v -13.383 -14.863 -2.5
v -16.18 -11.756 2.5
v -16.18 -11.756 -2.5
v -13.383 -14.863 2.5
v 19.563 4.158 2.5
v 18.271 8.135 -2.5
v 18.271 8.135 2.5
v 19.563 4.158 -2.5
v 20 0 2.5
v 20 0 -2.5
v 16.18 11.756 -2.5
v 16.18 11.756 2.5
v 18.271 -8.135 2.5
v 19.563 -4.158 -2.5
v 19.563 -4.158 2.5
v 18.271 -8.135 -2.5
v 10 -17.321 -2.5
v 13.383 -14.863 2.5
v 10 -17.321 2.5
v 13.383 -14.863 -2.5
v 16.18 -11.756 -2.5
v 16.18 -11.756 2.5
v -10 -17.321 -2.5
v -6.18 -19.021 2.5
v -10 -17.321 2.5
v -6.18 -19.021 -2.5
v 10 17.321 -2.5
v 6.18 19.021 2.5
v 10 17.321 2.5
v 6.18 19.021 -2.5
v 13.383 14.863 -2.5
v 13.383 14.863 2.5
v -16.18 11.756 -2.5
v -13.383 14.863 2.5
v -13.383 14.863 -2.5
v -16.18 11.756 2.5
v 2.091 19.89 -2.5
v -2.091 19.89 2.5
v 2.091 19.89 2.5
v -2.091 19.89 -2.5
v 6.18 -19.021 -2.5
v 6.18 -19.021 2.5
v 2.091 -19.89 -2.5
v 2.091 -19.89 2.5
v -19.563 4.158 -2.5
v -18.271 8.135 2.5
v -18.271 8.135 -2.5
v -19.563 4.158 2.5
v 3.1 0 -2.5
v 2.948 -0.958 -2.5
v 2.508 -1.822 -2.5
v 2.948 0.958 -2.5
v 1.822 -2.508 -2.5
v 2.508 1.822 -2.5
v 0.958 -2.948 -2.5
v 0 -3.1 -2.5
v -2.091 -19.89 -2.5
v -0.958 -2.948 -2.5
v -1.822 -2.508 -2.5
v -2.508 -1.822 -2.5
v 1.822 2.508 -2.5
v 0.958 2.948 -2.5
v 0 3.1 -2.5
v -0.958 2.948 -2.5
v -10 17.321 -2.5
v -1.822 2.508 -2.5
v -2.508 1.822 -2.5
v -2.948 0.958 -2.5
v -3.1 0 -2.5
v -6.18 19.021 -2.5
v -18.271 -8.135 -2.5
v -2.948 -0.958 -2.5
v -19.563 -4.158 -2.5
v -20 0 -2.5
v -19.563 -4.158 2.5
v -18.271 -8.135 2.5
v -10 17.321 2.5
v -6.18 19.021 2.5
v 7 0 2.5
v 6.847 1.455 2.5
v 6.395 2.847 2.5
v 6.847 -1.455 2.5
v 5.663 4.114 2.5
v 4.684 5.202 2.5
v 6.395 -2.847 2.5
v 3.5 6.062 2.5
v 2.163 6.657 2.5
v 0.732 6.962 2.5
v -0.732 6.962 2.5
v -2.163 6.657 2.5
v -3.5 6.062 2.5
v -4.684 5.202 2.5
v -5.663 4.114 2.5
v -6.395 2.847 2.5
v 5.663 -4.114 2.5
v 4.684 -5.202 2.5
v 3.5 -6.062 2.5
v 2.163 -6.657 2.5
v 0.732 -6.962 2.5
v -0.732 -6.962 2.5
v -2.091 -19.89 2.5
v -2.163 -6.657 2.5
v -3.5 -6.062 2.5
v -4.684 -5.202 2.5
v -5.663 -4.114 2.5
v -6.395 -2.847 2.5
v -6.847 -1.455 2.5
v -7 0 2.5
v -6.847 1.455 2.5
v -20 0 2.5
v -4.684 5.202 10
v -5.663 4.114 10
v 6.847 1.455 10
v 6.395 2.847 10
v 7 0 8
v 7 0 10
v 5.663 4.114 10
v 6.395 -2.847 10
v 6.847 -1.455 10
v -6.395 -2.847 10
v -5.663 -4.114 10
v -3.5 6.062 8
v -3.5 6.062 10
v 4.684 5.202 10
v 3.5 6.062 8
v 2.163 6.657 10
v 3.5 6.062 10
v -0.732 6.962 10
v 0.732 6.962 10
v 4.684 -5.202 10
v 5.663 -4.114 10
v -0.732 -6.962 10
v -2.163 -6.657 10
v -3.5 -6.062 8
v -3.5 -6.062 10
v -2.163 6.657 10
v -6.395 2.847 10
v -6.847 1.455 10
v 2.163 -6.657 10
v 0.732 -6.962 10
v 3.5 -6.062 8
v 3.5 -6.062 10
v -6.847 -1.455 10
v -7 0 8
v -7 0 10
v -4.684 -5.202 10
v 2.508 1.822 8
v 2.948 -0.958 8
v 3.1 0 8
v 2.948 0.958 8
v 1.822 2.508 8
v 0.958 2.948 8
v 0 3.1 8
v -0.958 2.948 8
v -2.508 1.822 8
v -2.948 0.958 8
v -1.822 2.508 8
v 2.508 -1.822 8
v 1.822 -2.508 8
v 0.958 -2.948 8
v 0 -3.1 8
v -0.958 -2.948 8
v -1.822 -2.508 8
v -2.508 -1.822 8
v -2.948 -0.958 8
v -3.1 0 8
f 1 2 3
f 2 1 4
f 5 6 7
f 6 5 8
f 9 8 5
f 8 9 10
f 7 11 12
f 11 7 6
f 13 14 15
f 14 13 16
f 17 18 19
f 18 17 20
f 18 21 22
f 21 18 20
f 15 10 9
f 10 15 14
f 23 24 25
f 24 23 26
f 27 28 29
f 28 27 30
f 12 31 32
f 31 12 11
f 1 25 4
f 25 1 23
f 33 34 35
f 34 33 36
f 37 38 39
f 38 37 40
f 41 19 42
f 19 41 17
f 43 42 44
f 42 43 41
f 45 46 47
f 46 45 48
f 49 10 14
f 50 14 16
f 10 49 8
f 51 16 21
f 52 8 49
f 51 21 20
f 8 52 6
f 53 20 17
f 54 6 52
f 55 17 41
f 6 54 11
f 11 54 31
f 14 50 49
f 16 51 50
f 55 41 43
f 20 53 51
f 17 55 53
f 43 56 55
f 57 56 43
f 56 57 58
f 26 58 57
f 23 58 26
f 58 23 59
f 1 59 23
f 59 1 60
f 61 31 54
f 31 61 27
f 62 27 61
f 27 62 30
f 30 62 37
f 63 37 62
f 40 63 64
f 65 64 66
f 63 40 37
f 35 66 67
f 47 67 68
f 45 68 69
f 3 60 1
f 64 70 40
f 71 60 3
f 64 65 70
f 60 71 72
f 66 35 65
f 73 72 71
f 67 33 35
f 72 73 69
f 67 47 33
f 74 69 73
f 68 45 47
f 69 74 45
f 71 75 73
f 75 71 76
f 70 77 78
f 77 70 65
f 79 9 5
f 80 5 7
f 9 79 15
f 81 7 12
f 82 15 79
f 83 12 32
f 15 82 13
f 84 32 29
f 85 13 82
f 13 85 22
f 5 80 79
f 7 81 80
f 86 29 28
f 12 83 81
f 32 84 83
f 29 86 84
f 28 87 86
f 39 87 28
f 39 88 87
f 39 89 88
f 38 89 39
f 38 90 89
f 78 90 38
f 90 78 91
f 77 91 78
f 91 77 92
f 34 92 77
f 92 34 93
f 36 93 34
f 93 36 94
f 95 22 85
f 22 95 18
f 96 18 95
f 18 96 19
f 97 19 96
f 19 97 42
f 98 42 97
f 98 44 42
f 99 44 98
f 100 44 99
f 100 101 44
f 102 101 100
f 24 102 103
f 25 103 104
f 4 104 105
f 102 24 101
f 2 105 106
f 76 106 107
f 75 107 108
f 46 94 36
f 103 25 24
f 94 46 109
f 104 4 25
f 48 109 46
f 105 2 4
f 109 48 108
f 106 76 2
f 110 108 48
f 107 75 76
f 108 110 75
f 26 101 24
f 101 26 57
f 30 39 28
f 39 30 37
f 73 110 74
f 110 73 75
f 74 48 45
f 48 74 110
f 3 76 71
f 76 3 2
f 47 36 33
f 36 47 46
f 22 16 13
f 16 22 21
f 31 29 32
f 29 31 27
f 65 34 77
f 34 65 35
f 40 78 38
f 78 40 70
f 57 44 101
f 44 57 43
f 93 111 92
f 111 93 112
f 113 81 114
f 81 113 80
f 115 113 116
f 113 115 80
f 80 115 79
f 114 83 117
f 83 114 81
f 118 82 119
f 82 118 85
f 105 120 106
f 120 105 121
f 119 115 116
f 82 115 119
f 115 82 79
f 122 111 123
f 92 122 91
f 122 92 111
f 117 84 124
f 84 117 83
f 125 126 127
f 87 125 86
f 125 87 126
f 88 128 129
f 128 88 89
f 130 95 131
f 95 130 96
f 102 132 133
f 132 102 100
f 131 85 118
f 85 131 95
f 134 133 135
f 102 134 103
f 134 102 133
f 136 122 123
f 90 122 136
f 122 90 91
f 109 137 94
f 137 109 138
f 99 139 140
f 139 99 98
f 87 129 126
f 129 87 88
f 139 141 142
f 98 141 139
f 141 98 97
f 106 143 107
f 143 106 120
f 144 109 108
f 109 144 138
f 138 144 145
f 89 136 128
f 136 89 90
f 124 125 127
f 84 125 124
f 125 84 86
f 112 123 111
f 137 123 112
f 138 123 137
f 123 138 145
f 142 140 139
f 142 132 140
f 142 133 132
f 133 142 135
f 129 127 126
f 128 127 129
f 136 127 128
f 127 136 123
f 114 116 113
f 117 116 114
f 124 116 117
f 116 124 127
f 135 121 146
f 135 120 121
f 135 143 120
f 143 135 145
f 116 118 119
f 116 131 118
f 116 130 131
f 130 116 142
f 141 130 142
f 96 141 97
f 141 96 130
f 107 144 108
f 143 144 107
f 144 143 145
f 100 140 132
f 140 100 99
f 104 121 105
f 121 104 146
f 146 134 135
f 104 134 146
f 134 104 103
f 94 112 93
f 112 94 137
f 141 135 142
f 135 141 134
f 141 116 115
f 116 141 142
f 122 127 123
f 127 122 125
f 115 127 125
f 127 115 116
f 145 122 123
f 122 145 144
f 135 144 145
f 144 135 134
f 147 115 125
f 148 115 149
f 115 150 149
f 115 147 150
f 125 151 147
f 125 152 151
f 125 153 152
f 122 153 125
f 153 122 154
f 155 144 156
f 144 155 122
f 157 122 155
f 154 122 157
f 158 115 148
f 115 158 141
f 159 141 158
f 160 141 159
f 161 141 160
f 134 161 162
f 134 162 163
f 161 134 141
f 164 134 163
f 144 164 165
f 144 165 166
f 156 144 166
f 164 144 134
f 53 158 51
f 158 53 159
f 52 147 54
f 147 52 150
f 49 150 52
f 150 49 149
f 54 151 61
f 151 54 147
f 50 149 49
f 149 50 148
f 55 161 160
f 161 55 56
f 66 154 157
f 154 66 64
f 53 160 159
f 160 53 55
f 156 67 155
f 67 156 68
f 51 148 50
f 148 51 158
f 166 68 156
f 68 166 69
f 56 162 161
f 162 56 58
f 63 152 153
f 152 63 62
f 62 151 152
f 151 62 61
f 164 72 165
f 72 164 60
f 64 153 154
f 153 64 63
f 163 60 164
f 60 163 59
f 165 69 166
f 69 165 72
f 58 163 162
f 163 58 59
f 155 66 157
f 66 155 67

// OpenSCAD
d_dado=6;




difference(){
union()
{cylinder(h =5, r = 20,  center = true,$fn=30);
    
translate ([0,0,5]) cylinder(h =10, r = 7,  center = true,$fn=30);
}
translate ([0,0,10])   cylinder(h =4, r = 7,  center = true,$fn=6);
 
 cylinder(h=30, r=3.1,$fn=20,center=true);   
    
}
